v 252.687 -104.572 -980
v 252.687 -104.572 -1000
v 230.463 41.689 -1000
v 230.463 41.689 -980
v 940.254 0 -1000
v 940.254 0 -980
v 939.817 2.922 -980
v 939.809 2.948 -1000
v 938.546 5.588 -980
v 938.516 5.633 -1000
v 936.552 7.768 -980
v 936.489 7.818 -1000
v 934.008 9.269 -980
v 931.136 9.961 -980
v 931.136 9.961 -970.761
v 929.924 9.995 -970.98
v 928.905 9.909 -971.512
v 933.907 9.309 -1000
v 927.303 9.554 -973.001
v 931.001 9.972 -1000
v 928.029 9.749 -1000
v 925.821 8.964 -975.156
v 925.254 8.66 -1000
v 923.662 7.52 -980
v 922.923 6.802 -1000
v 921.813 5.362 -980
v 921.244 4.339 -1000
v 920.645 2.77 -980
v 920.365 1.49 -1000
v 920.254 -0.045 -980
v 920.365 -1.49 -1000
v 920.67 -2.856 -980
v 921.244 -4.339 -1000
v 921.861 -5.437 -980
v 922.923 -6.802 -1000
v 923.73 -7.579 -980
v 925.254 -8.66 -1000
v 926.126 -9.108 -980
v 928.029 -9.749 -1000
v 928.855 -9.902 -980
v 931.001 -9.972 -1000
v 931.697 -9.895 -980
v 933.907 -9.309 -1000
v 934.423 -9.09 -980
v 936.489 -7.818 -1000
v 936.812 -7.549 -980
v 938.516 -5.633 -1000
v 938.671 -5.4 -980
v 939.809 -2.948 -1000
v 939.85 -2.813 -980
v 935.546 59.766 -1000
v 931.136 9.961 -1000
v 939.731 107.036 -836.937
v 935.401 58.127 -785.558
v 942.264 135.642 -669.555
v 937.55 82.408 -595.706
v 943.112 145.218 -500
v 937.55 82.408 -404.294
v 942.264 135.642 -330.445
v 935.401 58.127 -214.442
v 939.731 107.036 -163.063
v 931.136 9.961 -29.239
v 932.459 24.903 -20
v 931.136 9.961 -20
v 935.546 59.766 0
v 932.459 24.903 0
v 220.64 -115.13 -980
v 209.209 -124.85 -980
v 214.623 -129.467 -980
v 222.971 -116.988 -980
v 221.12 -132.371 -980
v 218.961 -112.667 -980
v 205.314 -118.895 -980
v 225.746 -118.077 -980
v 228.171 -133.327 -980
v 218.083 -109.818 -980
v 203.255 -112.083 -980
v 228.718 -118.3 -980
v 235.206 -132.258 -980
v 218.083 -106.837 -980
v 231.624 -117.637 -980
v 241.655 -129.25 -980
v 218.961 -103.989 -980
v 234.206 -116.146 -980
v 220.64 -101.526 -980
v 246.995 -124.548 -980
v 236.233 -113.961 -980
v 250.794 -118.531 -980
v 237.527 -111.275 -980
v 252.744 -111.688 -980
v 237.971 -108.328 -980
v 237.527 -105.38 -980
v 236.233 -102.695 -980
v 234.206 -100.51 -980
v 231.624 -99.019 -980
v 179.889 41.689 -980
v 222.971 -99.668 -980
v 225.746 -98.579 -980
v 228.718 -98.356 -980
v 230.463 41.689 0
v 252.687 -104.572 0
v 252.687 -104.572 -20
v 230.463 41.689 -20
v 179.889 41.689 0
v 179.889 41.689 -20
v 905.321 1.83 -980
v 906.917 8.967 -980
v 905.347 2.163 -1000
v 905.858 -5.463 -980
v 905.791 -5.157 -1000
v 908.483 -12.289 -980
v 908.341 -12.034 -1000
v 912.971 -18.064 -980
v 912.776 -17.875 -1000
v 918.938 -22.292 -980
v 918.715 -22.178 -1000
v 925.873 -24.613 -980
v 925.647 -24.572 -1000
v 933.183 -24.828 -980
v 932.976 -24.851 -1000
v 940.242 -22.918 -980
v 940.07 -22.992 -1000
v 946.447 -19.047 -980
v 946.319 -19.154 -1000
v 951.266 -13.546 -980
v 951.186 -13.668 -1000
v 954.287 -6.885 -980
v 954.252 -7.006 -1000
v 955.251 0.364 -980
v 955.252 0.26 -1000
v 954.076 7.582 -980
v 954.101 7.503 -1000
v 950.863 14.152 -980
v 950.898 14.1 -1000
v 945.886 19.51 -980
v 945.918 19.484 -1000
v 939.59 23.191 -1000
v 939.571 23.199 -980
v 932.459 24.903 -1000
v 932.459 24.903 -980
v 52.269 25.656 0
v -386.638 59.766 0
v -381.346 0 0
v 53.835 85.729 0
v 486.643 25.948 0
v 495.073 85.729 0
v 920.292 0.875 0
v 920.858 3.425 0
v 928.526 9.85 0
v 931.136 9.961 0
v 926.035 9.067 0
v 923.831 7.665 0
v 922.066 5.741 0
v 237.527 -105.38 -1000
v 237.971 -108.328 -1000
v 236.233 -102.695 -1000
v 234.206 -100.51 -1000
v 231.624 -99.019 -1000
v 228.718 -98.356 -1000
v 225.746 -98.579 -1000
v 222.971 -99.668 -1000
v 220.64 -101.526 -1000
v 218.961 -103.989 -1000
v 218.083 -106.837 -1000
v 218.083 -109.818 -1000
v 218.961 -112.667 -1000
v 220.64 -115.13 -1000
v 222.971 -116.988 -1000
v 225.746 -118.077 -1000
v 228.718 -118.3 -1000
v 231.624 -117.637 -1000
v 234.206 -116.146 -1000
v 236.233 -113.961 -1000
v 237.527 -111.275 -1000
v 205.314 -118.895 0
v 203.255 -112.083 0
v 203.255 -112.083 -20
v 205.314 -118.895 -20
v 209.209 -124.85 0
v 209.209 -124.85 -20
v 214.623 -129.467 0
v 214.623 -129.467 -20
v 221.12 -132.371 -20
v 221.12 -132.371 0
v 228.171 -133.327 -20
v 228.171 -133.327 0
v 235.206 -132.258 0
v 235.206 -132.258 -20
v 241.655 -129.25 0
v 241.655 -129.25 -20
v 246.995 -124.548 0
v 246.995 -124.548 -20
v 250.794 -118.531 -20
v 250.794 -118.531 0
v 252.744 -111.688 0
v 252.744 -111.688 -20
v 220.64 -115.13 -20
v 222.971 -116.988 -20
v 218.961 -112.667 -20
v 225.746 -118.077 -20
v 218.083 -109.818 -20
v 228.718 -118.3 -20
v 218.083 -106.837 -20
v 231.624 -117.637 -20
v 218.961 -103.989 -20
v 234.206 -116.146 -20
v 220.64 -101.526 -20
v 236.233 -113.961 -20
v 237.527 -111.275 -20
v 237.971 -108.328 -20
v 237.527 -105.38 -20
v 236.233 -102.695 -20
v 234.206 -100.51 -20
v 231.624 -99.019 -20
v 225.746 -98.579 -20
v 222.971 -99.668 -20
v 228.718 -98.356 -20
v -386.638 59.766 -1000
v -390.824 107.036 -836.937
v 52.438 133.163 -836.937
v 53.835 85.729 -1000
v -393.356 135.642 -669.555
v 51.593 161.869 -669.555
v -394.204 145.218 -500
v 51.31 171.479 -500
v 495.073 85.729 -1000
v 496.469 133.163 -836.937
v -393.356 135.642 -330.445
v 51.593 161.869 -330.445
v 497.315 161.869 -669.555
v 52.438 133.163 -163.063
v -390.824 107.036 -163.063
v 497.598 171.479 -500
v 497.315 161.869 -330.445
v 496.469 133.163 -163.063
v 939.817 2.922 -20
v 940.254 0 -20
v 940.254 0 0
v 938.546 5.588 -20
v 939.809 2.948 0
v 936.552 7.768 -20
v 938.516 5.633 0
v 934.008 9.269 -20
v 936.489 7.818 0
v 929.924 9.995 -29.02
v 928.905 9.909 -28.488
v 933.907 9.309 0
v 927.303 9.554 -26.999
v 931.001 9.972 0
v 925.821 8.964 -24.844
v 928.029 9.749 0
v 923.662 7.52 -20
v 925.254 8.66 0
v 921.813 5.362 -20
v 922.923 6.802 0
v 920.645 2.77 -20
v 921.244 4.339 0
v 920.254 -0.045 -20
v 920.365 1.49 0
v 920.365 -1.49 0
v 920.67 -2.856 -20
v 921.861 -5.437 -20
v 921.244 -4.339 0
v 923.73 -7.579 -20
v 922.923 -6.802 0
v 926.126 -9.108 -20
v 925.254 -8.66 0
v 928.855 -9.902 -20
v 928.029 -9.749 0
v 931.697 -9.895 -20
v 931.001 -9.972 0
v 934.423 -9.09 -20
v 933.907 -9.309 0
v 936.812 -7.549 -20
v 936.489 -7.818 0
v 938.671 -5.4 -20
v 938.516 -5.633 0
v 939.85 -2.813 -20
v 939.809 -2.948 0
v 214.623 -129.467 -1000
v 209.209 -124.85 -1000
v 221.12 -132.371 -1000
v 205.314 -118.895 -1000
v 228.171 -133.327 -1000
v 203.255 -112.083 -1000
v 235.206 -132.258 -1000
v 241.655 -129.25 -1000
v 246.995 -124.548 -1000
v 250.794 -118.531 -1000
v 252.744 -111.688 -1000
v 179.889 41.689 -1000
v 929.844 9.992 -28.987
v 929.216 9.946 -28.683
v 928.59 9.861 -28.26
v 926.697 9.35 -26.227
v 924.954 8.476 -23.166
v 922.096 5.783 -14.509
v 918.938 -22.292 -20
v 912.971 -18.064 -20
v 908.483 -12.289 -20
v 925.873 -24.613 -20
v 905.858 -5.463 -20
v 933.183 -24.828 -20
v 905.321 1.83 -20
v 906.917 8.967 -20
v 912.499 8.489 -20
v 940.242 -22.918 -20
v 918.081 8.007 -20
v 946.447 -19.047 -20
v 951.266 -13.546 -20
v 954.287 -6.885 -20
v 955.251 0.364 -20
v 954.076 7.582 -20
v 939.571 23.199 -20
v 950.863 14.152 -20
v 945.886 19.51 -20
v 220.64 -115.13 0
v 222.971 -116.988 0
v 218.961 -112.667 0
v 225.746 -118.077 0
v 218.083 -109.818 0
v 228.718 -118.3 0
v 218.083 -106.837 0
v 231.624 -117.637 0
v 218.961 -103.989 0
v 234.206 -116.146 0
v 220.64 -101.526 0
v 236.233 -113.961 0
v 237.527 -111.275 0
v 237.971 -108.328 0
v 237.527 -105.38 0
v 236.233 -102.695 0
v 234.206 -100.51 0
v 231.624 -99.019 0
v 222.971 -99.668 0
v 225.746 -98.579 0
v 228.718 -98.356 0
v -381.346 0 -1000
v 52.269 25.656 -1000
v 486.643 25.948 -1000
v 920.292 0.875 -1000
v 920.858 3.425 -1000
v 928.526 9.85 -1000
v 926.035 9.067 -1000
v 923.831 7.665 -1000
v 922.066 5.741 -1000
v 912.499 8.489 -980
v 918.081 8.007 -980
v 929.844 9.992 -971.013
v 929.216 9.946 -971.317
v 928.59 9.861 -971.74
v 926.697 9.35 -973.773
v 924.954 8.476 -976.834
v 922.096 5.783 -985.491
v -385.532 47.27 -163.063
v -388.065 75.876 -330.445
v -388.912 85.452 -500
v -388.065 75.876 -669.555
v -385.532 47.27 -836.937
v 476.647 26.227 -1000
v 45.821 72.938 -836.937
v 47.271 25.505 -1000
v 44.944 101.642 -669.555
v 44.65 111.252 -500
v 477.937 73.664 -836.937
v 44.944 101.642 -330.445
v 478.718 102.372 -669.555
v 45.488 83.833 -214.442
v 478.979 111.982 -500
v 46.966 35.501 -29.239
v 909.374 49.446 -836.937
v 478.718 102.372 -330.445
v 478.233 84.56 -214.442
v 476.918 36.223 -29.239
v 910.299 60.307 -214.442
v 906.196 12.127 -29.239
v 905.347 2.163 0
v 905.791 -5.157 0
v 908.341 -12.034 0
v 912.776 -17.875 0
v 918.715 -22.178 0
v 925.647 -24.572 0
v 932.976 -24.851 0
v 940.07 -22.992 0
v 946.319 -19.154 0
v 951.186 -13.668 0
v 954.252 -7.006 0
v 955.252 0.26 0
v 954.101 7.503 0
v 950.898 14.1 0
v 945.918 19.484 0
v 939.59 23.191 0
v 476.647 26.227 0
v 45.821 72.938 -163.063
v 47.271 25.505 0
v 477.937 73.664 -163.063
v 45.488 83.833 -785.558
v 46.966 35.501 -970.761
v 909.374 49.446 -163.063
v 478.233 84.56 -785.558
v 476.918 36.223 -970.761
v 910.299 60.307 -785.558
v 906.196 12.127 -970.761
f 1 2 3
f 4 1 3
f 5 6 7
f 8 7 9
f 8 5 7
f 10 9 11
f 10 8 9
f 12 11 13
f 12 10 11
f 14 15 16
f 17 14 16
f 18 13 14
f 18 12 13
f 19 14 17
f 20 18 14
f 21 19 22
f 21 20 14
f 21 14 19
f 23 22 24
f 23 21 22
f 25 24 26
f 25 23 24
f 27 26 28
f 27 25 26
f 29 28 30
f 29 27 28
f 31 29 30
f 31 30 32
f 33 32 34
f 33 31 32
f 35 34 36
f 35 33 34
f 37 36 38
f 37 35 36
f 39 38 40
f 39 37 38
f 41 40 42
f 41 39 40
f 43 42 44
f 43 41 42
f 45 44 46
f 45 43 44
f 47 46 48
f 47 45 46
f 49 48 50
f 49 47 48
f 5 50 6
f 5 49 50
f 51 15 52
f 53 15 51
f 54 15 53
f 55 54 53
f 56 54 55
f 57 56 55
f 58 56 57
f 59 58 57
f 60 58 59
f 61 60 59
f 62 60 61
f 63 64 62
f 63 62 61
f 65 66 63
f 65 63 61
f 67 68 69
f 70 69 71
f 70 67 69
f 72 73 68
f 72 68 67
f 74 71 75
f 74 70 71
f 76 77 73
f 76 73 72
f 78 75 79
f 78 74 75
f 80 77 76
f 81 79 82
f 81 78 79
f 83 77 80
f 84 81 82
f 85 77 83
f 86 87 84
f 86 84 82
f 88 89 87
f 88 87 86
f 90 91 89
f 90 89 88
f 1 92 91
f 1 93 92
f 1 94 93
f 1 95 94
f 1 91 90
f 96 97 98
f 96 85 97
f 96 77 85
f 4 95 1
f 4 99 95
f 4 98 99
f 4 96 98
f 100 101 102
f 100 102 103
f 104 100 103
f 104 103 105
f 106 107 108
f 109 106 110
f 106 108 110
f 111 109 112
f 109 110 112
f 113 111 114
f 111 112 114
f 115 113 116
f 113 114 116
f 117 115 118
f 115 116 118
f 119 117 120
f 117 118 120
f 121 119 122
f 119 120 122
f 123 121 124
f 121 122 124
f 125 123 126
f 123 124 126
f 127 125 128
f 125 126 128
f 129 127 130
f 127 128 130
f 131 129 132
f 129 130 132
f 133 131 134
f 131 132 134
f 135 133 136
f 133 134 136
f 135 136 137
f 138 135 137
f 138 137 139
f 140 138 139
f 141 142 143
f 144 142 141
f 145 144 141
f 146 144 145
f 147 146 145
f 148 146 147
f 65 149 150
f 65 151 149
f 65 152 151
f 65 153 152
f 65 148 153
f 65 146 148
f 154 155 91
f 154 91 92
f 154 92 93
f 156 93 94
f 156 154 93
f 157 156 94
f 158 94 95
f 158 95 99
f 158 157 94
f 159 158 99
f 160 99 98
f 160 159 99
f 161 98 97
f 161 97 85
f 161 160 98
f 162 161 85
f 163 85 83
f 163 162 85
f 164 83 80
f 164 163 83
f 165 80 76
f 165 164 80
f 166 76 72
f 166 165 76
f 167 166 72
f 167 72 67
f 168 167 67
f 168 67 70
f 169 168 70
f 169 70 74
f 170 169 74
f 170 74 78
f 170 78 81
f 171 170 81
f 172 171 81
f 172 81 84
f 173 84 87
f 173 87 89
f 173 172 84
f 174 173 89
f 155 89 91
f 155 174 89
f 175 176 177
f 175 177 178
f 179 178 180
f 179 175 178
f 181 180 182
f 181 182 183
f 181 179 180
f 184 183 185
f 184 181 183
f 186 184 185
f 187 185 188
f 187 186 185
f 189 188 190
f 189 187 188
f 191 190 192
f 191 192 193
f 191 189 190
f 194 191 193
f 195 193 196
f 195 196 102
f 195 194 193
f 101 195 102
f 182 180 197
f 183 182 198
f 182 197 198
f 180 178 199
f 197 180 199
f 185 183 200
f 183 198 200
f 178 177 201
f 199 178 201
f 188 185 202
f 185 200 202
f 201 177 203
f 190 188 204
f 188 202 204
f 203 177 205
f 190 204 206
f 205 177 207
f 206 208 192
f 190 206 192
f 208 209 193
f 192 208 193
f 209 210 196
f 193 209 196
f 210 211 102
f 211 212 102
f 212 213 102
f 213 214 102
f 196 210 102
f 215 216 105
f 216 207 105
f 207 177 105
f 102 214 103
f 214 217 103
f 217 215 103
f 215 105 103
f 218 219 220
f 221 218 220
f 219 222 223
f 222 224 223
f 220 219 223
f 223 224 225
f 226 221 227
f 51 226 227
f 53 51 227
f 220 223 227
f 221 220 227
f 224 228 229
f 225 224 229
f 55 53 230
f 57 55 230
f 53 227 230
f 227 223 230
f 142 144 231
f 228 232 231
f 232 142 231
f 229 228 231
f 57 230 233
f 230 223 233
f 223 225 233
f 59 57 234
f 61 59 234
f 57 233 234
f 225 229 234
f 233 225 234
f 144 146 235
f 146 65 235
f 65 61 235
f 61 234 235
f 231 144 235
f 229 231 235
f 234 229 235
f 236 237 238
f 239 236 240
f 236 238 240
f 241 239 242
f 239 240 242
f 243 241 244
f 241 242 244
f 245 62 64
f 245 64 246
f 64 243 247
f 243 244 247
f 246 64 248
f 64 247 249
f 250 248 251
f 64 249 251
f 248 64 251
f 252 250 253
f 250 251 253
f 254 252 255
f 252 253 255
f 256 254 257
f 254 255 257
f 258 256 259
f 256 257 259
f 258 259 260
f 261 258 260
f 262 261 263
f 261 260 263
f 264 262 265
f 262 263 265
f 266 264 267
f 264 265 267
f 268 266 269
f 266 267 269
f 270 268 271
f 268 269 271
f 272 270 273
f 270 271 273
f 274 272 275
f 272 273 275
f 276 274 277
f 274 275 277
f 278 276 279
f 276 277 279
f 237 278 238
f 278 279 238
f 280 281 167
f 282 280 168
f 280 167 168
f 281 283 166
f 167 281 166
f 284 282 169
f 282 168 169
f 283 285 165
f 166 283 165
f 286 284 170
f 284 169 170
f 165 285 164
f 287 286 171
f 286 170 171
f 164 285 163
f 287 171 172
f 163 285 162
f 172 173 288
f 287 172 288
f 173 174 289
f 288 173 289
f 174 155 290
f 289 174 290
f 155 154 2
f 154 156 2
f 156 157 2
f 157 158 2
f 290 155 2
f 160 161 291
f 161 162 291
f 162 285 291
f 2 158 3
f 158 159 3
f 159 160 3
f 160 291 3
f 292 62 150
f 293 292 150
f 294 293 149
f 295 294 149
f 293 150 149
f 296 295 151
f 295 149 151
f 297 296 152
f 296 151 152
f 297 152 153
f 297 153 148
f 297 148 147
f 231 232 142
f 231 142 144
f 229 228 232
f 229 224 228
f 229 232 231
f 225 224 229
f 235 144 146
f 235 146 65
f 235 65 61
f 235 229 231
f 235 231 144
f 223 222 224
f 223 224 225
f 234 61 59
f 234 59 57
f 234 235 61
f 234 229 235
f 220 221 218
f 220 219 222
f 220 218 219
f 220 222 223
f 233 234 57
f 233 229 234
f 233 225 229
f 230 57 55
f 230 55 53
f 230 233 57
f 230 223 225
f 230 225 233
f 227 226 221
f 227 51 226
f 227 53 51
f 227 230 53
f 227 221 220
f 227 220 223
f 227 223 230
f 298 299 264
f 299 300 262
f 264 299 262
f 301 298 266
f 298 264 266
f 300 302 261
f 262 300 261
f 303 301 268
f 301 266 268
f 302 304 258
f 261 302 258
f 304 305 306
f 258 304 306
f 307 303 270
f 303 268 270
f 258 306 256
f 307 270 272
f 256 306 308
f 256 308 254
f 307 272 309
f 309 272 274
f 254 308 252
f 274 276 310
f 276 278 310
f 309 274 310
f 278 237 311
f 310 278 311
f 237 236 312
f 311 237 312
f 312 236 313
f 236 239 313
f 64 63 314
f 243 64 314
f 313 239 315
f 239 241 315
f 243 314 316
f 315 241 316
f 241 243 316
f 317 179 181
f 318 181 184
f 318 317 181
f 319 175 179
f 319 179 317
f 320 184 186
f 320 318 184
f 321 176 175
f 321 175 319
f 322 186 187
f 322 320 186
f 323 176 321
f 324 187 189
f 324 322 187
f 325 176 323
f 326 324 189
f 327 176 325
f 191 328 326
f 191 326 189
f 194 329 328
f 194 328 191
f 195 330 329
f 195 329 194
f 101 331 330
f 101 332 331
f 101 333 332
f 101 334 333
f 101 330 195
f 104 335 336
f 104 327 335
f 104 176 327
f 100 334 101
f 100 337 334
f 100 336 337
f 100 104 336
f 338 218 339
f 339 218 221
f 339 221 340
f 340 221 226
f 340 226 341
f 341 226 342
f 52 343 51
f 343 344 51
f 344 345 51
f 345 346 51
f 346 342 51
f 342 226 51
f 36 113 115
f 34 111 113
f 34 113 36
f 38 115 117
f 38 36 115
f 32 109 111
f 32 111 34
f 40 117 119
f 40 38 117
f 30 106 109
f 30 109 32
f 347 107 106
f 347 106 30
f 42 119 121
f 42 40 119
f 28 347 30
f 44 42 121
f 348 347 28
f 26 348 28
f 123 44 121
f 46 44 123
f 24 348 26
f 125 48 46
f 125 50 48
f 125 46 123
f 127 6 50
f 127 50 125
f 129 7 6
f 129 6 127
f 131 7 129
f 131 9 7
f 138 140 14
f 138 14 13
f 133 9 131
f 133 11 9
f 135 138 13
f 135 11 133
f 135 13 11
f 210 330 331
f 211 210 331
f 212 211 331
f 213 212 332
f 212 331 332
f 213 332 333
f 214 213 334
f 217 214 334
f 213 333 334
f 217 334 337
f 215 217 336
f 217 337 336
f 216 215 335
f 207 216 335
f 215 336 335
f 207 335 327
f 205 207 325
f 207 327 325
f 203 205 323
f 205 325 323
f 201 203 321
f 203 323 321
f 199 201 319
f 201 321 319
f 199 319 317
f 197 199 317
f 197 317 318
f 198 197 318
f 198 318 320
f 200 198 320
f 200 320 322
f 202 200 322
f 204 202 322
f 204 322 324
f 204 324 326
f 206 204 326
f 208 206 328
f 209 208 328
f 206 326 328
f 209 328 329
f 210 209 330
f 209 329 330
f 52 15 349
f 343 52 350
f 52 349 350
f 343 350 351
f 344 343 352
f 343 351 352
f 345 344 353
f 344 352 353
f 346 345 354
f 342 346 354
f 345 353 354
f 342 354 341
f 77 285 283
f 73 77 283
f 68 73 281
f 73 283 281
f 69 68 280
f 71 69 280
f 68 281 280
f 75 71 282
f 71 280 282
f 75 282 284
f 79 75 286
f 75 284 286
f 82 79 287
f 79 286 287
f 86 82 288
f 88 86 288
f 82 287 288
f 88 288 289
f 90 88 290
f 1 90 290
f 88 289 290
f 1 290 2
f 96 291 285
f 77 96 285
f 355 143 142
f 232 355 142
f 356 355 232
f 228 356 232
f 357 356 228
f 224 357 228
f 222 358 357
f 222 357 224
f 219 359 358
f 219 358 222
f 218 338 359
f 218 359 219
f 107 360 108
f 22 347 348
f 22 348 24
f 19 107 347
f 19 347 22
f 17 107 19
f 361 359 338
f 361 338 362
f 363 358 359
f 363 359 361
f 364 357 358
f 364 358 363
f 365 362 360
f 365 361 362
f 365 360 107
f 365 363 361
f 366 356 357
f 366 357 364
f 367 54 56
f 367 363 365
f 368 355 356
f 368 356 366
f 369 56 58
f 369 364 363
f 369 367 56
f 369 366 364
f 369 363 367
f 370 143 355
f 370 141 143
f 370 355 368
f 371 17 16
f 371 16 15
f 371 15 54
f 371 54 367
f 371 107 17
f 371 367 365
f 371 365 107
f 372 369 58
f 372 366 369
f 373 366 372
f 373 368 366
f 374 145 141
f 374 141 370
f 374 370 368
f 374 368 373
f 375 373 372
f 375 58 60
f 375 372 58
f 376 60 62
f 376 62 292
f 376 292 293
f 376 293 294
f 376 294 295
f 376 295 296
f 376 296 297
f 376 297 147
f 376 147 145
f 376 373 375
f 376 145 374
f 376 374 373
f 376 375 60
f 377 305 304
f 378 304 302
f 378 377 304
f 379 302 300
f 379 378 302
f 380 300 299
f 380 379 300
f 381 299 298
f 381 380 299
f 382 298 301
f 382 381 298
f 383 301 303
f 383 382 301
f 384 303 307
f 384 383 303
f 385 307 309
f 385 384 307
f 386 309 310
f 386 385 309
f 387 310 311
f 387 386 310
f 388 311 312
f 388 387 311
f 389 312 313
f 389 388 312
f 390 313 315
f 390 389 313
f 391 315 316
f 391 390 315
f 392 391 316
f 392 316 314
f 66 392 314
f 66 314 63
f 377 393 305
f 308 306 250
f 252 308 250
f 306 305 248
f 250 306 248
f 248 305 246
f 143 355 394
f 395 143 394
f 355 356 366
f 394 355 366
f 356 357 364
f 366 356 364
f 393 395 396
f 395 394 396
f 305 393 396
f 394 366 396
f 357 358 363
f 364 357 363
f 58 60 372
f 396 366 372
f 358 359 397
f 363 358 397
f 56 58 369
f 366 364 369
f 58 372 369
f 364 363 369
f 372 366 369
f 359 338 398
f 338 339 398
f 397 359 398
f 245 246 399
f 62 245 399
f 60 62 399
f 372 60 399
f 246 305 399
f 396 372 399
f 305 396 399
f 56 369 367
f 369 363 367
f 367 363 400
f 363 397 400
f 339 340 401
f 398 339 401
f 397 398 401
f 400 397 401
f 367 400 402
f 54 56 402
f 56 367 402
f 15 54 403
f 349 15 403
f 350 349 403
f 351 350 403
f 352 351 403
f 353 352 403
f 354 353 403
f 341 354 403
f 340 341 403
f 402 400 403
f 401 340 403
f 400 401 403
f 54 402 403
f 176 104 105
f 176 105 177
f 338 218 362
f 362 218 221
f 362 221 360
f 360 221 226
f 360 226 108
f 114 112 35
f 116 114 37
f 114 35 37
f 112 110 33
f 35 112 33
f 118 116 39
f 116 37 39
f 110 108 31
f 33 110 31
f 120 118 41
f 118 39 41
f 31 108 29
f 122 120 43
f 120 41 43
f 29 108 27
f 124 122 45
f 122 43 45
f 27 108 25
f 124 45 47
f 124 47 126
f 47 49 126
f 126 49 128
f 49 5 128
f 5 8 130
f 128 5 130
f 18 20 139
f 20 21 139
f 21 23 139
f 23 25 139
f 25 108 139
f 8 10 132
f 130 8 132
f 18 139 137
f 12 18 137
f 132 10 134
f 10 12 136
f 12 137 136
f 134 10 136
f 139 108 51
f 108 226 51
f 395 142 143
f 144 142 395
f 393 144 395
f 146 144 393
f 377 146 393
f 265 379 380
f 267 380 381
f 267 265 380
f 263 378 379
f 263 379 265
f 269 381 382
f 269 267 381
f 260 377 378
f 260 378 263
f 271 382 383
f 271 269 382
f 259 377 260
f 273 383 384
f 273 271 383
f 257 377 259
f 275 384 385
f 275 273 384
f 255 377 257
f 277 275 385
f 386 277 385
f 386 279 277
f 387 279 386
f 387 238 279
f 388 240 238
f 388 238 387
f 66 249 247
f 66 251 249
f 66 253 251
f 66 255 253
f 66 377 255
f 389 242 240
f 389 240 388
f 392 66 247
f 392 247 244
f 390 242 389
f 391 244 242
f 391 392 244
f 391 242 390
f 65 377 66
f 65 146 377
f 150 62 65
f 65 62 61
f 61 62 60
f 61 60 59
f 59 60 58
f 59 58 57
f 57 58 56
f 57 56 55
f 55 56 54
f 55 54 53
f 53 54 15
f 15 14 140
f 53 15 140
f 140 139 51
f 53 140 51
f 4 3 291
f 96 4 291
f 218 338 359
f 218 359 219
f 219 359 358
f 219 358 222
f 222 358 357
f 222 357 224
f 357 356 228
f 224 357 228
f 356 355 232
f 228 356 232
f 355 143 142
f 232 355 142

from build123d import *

# Parameters (mm, degrees)
SKETCH3_R               = 10
BOSS_EXTRUDE1_DEPTH     = 20
SKETCH4_R               = 25
BOSS_EXTRUDE2_DEPTH     = 20
SKETCH5_R               = 10
CUT_EXTRUDE1_DEPTH      = 40
SKETCH9_R               = 10
CUT_EXTRUDE2_DEPTH      = 1.0000001
CUT_EXTRUDE2_DEPTH_BACK = 1001.0000001


with BuildPart() as part:
    # Sweep1: sweep along a path in Sketch1
    with BuildLine(Plane.XY) as sweep1_path:
        ThreePointArc((-381.346255507, 0), (274.453744493, 28.976752889), (930.253744493, 0))
    # Sketch2 → Sweep1 (sweep)
    with BuildSketch(Plane(origin=(-381.346255507, 0, 0), x_dir=(0, 0, -1), z_dir=(0.996102918, 0.088198507, 0))):
        with BuildLine():
            Line((1000, 0), (1000, 60))
            ThreePointArc((1000, 60), (500, 145.786437627), (0, 60))
            Line((0, 60), (0, 0))
            ThreePointArc((0, 0), (500, 85.786437627), (1000, 0))
        make_face()
    sweep(path=sweep1_path.line)

    # Sketch4 → Boss-Extrude2 (add)
    with BuildSketch(Plane.XY):
        with Locations((930.253744493, 0)):
            Circle(SKETCH4_R)
    extrude(amount=-BOSS_EXTRUDE2_DEPTH)

    # Sketch5 → Cut-Extrude1 (cut)
    with BuildSketch(Plane.XY):
        with Locations((930.253744493, 0)):
            Circle(SKETCH5_R)
    extrude(amount=-CUT_EXTRUDE1_DEPTH, mode=Mode.SUBTRACT)


with BuildPart() as body_2:
    # Sketch3 → Boss-Extrude1 (new body)
    with BuildSketch(Plane.XY):
        with BuildLine():
            Line((230.462804943, 41.688976459), (179.888879124, 41.688976459))
            Line((179.888879124, 41.688976459), (203.254594848, -112.083465063))
            ThreePointArc((203.254594848, -112.083465063), (231.726528195, -133.044118954), (252.687182085, -104.572185607))
            Line((252.687182085, -104.572185607), (230.462804943, 41.688976459))
        make_face()
        with Locations((227.970888467, -108.327825335)):
            Circle(SKETCH3_R, mode=Mode.SUBTRACT)
    extrude(amount=-BOSS_EXTRUDE1_DEPTH)


with BuildPart() as body_3:
    # Mirror5: mirrored copy
    add(body_2.part.mirror(Plane.XY.offset(-500)))


with BuildPart() as body_4:
    # Mirror5 2: mirrored copy
    add(part.part.mirror(Plane.XY.offset(-500)))


with BuildPart() as cut_extrude2_tool:
    # Sketch9 → Cut-Extrude2 (new body, two sides)
    with BuildSketch(Plane.XY) as cut_extrude2_sk:
        with Locations((930.253744493, 0)):
            Circle(SKETCH9_R)
    extrude(amount=CUT_EXTRUDE2_DEPTH)
    extrude(cut_extrude2_sk.sketch, amount=-CUT_EXTRUDE2_DEPTH_BACK)


with BuildPart() as part_1:
    add(part.part)

    # Cut-Extrude2: cut by cut_extrude2_tool
    add(cut_extrude2_tool.part, mode=Mode.SUBTRACT)


with BuildPart() as body_4_1:
    add(body_4.part)

    # Cut-Extrude2: cut by cut_extrude2_tool
    add(cut_extrude2_tool.part, mode=Mode.SUBTRACT)


solid = Compound([body_2.part, body_3.part, part_1.part, body_4_1.part])
